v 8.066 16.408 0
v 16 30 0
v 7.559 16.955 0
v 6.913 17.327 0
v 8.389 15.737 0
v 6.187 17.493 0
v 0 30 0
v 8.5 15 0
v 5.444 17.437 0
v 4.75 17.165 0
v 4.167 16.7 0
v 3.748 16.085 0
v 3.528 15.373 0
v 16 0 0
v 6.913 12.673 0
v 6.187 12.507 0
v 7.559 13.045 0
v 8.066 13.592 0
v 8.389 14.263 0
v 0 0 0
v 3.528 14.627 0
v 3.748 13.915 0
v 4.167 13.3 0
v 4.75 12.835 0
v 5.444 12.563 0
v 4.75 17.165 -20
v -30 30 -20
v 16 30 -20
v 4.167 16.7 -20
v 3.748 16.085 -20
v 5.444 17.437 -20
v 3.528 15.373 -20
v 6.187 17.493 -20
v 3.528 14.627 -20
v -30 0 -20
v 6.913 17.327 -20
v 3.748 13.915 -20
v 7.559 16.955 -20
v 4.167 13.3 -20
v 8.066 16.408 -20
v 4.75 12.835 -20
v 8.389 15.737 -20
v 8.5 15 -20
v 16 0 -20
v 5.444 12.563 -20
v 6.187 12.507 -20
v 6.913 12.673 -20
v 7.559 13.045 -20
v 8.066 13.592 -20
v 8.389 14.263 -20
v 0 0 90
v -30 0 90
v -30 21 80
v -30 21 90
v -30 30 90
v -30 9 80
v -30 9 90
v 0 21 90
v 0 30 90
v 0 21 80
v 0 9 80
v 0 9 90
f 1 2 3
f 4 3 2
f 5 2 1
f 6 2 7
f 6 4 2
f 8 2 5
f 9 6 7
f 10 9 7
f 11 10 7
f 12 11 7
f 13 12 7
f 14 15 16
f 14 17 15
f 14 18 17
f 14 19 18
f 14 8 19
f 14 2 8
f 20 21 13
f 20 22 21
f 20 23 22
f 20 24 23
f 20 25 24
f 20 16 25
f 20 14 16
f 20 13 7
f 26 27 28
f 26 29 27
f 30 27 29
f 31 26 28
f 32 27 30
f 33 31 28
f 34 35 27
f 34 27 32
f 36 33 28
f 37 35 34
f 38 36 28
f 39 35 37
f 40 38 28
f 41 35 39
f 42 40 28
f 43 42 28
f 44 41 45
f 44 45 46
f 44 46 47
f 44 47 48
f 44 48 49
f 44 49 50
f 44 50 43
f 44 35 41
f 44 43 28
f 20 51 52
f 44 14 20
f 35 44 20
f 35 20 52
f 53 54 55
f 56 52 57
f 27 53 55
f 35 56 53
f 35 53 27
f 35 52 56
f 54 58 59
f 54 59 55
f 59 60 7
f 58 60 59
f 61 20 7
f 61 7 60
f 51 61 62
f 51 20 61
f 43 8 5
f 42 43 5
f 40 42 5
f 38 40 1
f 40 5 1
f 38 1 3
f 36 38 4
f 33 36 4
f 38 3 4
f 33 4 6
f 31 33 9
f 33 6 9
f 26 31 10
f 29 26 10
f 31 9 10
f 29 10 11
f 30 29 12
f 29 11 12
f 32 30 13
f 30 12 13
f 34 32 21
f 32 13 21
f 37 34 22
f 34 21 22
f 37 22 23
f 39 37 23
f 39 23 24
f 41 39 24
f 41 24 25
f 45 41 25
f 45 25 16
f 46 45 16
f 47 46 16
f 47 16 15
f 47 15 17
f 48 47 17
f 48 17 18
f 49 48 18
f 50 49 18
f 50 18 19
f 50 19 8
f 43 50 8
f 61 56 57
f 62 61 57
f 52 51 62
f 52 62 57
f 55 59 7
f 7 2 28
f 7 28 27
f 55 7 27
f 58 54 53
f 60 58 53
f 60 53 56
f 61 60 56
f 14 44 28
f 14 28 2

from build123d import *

# Parameters (mm, degrees)
EXTRUDE_1_DEPTH          = 30
SKETCH_2_R               = 2.5
CUT_EXTRUDE_1_DEPTH      = 21
CUT_EXTRUDE_2_DEPTH      = 1
CUT_EXTRUDE_2_DEPTH_BACK = 47


with BuildPart() as part:
    # Эскиз1 → Бобышка-Вытянуть1 (new body)
    with BuildSketch(Plane(origin=(0, 0, 0), x_dir=(1, 0, 0), z_dir=(0, 1, 0))):
        Polygon((0, 0), (0, -90), (-30, -90), (-30, 20), (16, 20), (16, 0), align=None)
    extrude(amount=EXTRUDE_1_DEPTH)

    # Эскиз2 → Вырез-Вытянуть1 (cut, through all)
    with BuildSketch(Plane.XY):
        with Locations((6, 15)):
            Circle(SKETCH_2_R)
    extrude(amount=-CUT_EXTRUDE_1_DEPTH, mode=Mode.SUBTRACT)

    # Эскиз3 → Вырез-Вытянуть2 (cut, two sides)
    with BuildSketch(Plane.ZY.offset(30)) as cut_extrude_2_sk:
        Polygon((323.973212684, 21), (90, 21), (80, 21), (80, 9), (90, 9), (323.973212684, 9), (791.919638052, 9), (791.919638052, 21), align=None)
    extrude(amount=CUT_EXTRUDE_2_DEPTH, mode=Mode.SUBTRACT)
    extrude(cut_extrude_2_sk.sketch, amount=-CUT_EXTRUDE_2_DEPTH_BACK, mode=Mode.SUBTRACT)


solid = part.part
